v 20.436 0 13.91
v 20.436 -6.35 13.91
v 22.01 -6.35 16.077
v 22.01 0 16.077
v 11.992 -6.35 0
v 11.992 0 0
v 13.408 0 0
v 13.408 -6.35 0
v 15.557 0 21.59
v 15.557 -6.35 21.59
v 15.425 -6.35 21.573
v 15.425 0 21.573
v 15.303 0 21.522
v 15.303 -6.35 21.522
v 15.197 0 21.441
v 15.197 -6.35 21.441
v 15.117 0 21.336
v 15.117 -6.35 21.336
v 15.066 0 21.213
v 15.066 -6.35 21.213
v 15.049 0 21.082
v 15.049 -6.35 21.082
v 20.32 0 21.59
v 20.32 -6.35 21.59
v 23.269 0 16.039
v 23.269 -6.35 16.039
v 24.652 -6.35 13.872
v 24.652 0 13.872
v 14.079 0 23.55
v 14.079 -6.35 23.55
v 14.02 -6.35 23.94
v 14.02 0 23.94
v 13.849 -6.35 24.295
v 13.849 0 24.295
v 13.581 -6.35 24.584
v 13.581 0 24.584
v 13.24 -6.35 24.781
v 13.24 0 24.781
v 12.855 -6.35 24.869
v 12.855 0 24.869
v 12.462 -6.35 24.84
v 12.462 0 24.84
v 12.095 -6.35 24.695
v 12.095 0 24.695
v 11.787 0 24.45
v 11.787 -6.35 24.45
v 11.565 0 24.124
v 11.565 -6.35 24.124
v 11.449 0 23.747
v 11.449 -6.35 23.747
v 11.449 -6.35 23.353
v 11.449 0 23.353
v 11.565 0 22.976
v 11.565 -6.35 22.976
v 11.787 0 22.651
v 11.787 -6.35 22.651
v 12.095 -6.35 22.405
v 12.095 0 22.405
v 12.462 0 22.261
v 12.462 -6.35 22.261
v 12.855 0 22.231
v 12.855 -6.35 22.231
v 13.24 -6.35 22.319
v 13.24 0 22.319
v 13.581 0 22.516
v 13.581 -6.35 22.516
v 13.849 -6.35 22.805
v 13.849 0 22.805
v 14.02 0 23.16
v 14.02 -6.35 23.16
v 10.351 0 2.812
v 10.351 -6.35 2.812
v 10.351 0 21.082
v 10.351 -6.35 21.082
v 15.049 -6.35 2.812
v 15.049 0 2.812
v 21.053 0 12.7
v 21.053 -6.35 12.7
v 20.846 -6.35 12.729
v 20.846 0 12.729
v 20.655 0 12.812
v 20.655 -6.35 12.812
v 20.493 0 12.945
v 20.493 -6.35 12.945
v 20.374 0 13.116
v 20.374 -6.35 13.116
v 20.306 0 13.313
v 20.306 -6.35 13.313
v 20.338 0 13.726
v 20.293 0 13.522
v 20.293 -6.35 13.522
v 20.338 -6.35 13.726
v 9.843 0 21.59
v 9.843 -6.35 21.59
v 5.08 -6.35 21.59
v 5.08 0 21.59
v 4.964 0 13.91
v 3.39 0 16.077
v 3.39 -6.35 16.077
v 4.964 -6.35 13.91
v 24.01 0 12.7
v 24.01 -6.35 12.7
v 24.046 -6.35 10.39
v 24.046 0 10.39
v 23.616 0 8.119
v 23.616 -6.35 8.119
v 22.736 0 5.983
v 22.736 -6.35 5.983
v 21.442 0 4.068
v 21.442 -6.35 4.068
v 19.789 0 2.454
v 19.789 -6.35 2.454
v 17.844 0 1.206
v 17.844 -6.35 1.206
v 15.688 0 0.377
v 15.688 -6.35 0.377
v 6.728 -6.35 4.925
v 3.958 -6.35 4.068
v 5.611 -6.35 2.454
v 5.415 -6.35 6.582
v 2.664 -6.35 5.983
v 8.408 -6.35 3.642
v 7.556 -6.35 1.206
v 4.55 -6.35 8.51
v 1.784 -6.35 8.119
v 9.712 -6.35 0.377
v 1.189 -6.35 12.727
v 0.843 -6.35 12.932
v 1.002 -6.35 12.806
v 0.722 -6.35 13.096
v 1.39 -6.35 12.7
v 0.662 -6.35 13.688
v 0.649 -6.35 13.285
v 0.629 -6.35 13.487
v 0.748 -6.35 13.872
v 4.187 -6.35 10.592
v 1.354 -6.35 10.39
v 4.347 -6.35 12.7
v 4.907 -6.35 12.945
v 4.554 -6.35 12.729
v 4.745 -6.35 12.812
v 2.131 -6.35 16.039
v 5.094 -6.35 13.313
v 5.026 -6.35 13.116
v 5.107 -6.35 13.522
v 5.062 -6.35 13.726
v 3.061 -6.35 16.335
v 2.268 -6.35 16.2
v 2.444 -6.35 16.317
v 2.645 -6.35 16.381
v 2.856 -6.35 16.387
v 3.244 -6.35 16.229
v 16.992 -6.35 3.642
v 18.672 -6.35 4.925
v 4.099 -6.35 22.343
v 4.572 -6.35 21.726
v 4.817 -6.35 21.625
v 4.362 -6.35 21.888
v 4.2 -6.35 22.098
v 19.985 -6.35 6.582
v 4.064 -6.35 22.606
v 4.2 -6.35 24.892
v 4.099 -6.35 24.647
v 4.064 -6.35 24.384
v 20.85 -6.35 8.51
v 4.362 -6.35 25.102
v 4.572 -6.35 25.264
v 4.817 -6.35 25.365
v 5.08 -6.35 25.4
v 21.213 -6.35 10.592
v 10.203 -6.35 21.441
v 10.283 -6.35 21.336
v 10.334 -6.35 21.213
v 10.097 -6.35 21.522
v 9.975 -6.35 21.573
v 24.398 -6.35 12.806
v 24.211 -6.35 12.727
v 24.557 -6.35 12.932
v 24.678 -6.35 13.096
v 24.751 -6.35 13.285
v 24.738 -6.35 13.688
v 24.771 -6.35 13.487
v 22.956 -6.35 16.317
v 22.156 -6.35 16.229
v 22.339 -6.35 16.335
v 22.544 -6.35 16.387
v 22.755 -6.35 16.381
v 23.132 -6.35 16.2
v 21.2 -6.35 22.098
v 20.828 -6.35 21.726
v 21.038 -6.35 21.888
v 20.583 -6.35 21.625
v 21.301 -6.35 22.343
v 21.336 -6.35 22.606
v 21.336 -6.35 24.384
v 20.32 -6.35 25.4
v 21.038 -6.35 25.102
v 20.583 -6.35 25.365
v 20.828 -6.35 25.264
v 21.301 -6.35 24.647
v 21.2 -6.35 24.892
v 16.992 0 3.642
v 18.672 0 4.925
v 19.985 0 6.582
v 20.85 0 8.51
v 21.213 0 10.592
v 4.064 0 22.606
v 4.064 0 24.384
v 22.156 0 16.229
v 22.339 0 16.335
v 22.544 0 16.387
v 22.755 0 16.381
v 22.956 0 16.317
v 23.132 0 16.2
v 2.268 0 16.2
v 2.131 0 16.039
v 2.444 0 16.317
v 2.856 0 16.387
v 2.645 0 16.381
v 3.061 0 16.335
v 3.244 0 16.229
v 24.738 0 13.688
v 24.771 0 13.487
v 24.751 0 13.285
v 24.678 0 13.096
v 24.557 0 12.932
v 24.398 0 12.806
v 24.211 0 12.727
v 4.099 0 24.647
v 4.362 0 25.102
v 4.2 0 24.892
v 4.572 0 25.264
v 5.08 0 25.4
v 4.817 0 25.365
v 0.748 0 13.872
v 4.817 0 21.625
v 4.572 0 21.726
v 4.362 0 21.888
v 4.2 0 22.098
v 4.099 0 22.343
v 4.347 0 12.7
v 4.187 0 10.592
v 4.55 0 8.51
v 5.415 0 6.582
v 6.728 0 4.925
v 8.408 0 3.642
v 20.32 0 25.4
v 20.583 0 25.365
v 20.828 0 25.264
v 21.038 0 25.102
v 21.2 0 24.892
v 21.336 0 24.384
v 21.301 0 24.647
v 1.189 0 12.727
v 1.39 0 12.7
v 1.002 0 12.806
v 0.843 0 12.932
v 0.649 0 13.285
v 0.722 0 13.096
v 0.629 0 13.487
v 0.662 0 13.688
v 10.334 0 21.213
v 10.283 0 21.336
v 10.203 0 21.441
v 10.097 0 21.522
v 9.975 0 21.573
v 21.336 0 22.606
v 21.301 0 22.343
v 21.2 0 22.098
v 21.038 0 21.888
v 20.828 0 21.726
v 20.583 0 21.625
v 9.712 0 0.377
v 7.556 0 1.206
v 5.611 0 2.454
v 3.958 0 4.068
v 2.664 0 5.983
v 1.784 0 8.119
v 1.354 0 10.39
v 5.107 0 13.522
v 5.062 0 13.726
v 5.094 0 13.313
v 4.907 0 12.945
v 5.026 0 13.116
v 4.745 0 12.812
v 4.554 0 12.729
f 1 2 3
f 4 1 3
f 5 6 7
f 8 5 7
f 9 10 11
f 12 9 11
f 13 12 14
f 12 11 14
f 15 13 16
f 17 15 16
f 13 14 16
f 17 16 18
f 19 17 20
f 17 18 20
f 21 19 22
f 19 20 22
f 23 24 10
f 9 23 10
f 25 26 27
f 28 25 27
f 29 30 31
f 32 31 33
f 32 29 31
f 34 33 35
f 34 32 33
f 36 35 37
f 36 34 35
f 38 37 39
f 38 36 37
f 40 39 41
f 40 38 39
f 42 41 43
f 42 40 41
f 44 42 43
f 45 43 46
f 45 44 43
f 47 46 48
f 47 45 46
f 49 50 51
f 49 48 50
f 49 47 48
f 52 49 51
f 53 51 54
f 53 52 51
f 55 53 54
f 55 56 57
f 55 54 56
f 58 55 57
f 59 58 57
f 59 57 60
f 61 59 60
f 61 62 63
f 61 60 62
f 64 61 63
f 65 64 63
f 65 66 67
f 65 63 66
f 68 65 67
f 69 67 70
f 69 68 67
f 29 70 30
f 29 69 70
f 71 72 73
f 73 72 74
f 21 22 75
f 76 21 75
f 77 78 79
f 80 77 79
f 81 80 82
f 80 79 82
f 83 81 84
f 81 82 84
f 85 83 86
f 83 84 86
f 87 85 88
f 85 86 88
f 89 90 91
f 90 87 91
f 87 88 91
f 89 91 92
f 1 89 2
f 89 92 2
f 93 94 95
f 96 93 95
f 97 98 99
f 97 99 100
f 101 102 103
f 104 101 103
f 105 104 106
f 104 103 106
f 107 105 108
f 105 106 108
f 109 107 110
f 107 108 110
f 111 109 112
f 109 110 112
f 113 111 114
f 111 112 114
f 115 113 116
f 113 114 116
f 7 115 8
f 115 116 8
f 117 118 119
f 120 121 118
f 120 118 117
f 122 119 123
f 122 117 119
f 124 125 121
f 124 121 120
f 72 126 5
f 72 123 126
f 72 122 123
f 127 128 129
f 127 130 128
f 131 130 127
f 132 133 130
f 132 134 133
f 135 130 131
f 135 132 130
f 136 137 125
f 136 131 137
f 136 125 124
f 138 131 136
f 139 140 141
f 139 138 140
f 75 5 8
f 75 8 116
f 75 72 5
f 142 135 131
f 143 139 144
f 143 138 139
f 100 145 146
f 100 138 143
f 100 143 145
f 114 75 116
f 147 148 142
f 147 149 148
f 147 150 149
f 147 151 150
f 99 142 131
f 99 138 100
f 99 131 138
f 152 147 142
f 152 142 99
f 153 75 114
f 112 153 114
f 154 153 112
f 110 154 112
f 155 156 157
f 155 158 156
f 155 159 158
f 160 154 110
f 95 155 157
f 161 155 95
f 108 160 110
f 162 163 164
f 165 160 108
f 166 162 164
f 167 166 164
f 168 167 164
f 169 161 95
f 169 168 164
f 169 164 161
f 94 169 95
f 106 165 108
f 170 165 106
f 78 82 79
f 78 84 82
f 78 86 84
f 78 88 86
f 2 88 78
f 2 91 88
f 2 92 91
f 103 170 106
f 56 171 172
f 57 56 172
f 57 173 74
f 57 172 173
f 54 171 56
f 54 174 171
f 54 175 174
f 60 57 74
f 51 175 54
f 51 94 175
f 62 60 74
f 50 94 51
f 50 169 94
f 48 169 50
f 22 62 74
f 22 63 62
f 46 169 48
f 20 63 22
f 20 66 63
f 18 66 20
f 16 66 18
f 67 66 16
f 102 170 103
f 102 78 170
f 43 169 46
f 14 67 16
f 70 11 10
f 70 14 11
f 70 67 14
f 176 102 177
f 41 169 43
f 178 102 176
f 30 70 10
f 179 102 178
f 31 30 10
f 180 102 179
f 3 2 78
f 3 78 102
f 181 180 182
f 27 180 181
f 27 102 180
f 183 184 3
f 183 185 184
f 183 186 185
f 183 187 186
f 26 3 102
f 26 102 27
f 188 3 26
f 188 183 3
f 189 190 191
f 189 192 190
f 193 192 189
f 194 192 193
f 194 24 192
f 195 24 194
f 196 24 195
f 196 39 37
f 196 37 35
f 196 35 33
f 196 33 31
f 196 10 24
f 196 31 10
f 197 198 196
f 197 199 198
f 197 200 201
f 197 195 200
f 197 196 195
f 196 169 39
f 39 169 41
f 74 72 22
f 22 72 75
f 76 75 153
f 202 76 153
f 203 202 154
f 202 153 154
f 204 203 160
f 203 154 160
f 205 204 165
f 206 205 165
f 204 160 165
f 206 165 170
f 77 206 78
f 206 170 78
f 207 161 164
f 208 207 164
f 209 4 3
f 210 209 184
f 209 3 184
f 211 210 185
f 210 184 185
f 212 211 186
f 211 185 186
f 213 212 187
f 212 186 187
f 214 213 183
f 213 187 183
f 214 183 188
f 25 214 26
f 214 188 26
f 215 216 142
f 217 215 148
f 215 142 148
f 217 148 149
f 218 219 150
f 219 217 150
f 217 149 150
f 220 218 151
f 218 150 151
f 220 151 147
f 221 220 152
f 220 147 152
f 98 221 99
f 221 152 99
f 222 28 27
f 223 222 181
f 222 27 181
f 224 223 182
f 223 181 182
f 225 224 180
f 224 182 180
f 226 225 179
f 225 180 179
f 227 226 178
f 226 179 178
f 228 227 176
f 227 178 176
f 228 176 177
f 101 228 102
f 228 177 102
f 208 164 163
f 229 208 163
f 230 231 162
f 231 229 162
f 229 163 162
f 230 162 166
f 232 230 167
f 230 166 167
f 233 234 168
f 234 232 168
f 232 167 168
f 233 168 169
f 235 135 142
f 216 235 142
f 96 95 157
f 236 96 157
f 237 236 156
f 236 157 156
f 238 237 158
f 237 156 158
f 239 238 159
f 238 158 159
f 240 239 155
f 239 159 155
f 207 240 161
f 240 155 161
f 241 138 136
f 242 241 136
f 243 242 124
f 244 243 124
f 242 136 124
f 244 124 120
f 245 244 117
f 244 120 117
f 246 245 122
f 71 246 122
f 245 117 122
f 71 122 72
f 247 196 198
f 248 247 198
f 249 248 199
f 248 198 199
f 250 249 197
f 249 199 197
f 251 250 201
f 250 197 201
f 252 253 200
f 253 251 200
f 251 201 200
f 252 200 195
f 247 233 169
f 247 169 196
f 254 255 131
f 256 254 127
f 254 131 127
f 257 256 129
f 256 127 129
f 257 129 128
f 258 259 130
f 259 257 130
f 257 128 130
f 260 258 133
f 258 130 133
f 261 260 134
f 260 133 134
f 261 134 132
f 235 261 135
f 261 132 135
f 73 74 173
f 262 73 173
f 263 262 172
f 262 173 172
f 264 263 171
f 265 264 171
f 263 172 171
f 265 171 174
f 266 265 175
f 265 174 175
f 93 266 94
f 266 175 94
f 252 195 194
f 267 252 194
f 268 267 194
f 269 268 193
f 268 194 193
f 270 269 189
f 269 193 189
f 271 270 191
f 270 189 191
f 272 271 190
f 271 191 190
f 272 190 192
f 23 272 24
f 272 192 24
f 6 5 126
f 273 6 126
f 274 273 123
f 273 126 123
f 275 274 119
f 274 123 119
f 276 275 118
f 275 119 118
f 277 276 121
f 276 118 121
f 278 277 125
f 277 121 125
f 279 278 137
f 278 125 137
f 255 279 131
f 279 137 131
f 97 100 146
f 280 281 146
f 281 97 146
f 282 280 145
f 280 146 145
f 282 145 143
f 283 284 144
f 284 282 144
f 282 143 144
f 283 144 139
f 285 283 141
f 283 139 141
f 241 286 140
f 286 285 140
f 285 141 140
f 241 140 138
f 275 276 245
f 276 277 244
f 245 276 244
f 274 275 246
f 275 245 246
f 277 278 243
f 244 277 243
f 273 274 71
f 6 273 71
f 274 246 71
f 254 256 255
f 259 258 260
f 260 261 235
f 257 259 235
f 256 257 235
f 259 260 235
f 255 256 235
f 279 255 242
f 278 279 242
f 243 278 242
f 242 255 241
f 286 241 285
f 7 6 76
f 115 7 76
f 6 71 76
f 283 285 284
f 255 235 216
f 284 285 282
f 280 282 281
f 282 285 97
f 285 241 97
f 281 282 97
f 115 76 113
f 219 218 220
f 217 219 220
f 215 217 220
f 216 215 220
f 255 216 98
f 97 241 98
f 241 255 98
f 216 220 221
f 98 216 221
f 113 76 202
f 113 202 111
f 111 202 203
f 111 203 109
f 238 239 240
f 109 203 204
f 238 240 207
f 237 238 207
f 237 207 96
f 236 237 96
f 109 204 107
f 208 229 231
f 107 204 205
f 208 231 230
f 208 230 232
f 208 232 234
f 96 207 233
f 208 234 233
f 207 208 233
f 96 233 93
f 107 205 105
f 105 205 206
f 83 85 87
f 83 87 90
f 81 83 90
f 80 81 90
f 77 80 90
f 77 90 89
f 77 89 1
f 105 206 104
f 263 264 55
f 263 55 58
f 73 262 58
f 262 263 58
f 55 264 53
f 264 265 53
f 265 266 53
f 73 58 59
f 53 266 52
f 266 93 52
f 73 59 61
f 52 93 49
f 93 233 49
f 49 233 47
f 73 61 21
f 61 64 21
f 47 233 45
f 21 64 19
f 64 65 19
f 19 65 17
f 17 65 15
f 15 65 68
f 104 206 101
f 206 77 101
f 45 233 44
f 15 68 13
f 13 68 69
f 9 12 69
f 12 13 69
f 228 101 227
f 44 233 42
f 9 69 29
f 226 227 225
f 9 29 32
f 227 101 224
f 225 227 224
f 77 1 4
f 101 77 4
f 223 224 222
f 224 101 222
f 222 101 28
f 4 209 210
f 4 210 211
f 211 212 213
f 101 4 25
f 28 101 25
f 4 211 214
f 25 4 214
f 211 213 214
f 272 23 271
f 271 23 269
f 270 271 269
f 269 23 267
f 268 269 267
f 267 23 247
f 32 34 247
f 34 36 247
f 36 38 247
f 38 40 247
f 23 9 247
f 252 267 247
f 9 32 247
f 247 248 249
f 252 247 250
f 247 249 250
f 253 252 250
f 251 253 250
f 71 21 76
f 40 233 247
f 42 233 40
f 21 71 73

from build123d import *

# Parameters (mm, degrees)
F0_W     = 25.4
F0_H     = 25.4
F1_DEPTH = 6.35
F3_DEPTH = 25.4
F4_R     = 1.3225172329
F5_DEPTH = 25.4


# Not quite as in the source:
# - a feature names something its author has since deleted; it is built from what else it names


with BuildPart() as f1:
    # F0 (on Front) → F1 (new body)
    with BuildSketch(Plane.XZ):
        with Locations((12.7, 12.7)):
            Rectangle(F0_W, F0_H)
    extrude(amount=F1_DEPTH)

    # F2 (on face) → F3 (cut)
    with BuildSketch(Plane.XZ.offset(6.35)):
        with BuildLine():
            ThreePointArc((4.347079063, 12.7), (5.4149768535, 6.5815794315), (10.3514468814, 2.8123965482))
            Line((10.3514468814, 2.8123965482), (10.3514468814, 21.082))
            ThreePointArc((10.3514468814, 21.082), (10.2026571262, 21.4412102448), (9.8434468814, 21.59))
            Line((9.8434468814, 21.59), (5.08, 21.59))
            ThreePointArc((5.08, 21.59), (4.3615795103, 21.8875795103), (4.064, 22.606))
            Line((4.064, 22.606), (4.064, 24.384))
            ThreePointArc((4.064, 24.384), (4.3615795103, 25.1024204897), (5.08, 25.4))
            Line((5.08, 25.4), (0, 25.4))
            Line((0, 25.4), (0, 0))
            Line((0, 0), (11.9920649295, 0))
            ThreePointArc((11.9920649295, 0), (3.957639074, 4.0680963279), (1.3902190546, 12.7))
            ThreePointArc((1.3902190546, 12.7), (0.7220113765, 13.0957453087), (0.7478720811, 13.8719199503))
            Line((0.7478720811, 13.8719199503), (2.1310466878, 16.0393626953))
            ThreePointArc((2.1310466878, 16.0393626953), (2.7505395089, 16.3910999432), (3.390007158, 16.0771388424))
            Line((3.390007158, 16.0771388424), (4.9636925598, 13.9096960974))
            ThreePointArc((4.9636925598, 13.9096960974), (5.025970964, 13.1159511785), (4.347079063, 12.7))
        make_face()
        with BuildLine():
            Line((25.4, 25.4), (20.32, 25.4))
            ThreePointArc((20.32, 25.4), (21.0384204897, 25.1024204897), (21.336, 24.384))
            Line((21.336, 24.384), (21.336, 22.606))
            ThreePointArc((21.336, 22.606), (21.0384204897, 21.8875795103), (20.32, 21.59))
            Line((20.32, 21.59), (15.5565531186, 21.59))
            ThreePointArc((15.5565531186, 21.59), (15.1973428738, 21.4412102448), (15.0485531186, 21.082))
            Line((15.0485531186, 21.082), (15.0485531186, 15.5096852131))
            Line((15.0485531186, 15.5096852131), (15.0485531186, 2.8123965482))
            ThreePointArc((15.0485531186, 2.8123965482), (19.9850231465, 6.5815794315), (21.052920937, 12.7))
            ThreePointArc((21.052920937, 12.7), (20.374029036, 13.1159511785), (20.4363074402, 13.9096960974))
            Line((20.4363074402, 13.9096960974), (22.009992842, 16.0771388424))
            ThreePointArc((22.009992842, 16.0771388424), (22.6494604911, 16.3910999432), (23.2689533122, 16.0393626953))
            Line((23.2689533122, 16.0393626953), (24.6521279189, 13.8719199503))
            ThreePointArc((24.6521279189, 13.8719199503), (24.6779886235, 13.0957453087), (24.0097809454, 12.7))
            ThreePointArc((24.0097809454, 12.7), (21.442360926, 4.0680963279), (13.4079350705, 0))
            Line((13.4079350705, 0), (25.4, 0))
            Line((25.4, 0), (25.4, 25.4))
        make_face()
    extrude(amount=-F3_DEPTH, mode=Mode.SUBTRACT)

    # F4 (on Front) → F5 (cut)
    with BuildSketch(Plane.XZ):
        with Locations((12.7565525472, 23.5501565039)):
            Circle(F4_R)
    extrude(amount=F5_DEPTH, mode=Mode.SUBTRACT)


solid = f1.part
